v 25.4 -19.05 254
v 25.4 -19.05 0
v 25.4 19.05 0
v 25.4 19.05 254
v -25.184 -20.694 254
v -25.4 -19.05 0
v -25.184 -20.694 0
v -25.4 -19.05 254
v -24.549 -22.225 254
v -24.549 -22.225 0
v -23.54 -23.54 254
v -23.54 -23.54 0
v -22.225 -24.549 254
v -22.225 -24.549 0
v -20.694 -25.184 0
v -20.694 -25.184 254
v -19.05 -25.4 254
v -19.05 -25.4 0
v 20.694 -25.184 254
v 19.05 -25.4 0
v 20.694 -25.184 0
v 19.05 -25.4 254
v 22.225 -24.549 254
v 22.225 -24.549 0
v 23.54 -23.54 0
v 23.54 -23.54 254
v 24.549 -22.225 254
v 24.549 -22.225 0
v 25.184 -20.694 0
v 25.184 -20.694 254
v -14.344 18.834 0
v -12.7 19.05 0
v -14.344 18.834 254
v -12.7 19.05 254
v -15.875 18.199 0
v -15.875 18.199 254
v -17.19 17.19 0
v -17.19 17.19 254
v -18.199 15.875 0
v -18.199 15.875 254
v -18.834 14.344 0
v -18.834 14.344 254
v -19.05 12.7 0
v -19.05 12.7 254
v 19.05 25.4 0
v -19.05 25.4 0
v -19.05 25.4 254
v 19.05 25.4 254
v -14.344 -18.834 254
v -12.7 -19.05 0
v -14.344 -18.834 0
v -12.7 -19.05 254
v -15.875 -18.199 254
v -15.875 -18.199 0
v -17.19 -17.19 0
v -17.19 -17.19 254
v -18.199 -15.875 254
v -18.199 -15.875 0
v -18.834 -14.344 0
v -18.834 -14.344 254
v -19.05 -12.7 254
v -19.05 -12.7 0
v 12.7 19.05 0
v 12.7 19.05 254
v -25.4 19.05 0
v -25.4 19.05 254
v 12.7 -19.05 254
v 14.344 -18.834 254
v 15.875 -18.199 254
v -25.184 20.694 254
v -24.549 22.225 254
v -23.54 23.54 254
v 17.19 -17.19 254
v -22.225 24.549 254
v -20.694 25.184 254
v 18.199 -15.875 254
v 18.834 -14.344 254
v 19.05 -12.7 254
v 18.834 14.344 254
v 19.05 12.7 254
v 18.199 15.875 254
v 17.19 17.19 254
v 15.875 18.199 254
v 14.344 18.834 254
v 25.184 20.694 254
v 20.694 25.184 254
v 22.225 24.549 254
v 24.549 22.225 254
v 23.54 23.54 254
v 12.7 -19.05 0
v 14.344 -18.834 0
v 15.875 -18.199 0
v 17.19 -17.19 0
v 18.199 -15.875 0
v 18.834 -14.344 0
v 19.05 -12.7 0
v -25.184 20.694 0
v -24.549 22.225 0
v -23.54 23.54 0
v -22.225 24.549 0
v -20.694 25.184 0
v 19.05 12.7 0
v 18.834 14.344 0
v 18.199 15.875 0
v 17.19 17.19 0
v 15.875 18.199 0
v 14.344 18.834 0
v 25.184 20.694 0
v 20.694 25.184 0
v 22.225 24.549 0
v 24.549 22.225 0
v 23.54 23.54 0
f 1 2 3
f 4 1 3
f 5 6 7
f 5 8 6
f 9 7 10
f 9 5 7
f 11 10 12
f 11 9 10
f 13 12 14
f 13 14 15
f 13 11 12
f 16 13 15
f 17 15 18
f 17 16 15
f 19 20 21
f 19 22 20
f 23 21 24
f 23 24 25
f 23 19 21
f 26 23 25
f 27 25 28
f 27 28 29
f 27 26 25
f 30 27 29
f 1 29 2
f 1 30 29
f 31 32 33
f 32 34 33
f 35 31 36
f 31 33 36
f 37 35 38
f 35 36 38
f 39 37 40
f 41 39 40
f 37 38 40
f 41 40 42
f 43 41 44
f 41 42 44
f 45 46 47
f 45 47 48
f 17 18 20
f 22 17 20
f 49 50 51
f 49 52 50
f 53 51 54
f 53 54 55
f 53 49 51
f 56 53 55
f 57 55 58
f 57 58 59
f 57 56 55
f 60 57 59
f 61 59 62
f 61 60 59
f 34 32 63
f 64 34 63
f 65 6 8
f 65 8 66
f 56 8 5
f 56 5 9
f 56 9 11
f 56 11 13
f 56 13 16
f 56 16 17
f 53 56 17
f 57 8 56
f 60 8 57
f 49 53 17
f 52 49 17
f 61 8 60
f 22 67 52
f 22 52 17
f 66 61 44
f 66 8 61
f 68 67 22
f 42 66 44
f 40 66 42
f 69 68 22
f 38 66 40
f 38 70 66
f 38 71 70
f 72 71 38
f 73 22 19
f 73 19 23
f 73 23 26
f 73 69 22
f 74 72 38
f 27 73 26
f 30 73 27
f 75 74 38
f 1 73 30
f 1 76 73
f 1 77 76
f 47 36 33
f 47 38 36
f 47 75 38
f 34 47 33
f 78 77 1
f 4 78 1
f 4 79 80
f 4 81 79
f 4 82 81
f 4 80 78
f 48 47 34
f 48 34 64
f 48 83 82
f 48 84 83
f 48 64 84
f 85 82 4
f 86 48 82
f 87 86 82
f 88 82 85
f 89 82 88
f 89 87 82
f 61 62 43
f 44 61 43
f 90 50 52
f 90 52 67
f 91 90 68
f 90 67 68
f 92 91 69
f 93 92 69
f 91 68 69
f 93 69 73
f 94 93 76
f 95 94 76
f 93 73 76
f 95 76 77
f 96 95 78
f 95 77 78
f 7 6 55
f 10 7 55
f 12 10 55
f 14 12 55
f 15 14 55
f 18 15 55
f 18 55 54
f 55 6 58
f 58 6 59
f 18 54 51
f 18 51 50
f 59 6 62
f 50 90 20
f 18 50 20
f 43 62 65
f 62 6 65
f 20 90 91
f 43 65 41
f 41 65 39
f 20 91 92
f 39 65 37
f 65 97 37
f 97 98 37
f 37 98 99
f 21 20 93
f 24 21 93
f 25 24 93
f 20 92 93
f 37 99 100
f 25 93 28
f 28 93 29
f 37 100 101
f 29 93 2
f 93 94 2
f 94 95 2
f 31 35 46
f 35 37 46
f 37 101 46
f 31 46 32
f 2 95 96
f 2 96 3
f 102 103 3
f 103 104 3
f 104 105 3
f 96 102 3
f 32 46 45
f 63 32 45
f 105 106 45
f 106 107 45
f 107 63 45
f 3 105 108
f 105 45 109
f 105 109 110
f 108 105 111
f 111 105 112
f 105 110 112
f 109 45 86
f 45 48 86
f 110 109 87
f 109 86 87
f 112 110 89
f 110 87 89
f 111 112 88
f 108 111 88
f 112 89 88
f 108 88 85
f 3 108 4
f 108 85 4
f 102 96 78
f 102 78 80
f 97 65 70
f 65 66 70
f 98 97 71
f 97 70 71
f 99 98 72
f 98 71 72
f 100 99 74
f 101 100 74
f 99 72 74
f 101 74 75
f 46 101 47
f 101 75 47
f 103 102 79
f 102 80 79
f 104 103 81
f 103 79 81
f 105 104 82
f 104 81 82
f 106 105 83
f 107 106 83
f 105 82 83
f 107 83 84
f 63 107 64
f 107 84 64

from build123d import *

# Parameters (mm, degrees)
F0_W     = 50.8
F0_H     = 50.8
F0_W_2   = 38.1
F0_H_2   = 38.1
F1_DEPTH = 254
F2_R     = 6.35
F3_R     = 6.35


with BuildPart() as f1:
    # F0 (on Top) → F1 (new body)
    with BuildSketch(Plane.XY):
        Rectangle(F0_W, F0_H)
        Rectangle(F0_W_2, F0_H_2, mode=Mode.SUBTRACT)
    extrude(amount=F1_DEPTH)

    # F2
    f2_edges = [f1.edges().sort_by_distance(p)[0] for p in [
        (-25.4, 25.4, 127),
        (-25.4, -25.4, 127),
        (19.05, -19.05, 127),
        (25.4, 25.4, 127),
        (-19.05, -19.05, 127),
        (-19.05, 19.05, 127),
        (19.05, 19.05, 127),
    ]]
    fillet(f2_edges, radius=F2_R)

    # F3
    f3_edges = [f1.edges().sort_by_distance(p)[0] for p in [
        (25.4, -25.4, 127),
    ]]
    fillet(f3_edges, radius=F3_R)


solid = f1.part
